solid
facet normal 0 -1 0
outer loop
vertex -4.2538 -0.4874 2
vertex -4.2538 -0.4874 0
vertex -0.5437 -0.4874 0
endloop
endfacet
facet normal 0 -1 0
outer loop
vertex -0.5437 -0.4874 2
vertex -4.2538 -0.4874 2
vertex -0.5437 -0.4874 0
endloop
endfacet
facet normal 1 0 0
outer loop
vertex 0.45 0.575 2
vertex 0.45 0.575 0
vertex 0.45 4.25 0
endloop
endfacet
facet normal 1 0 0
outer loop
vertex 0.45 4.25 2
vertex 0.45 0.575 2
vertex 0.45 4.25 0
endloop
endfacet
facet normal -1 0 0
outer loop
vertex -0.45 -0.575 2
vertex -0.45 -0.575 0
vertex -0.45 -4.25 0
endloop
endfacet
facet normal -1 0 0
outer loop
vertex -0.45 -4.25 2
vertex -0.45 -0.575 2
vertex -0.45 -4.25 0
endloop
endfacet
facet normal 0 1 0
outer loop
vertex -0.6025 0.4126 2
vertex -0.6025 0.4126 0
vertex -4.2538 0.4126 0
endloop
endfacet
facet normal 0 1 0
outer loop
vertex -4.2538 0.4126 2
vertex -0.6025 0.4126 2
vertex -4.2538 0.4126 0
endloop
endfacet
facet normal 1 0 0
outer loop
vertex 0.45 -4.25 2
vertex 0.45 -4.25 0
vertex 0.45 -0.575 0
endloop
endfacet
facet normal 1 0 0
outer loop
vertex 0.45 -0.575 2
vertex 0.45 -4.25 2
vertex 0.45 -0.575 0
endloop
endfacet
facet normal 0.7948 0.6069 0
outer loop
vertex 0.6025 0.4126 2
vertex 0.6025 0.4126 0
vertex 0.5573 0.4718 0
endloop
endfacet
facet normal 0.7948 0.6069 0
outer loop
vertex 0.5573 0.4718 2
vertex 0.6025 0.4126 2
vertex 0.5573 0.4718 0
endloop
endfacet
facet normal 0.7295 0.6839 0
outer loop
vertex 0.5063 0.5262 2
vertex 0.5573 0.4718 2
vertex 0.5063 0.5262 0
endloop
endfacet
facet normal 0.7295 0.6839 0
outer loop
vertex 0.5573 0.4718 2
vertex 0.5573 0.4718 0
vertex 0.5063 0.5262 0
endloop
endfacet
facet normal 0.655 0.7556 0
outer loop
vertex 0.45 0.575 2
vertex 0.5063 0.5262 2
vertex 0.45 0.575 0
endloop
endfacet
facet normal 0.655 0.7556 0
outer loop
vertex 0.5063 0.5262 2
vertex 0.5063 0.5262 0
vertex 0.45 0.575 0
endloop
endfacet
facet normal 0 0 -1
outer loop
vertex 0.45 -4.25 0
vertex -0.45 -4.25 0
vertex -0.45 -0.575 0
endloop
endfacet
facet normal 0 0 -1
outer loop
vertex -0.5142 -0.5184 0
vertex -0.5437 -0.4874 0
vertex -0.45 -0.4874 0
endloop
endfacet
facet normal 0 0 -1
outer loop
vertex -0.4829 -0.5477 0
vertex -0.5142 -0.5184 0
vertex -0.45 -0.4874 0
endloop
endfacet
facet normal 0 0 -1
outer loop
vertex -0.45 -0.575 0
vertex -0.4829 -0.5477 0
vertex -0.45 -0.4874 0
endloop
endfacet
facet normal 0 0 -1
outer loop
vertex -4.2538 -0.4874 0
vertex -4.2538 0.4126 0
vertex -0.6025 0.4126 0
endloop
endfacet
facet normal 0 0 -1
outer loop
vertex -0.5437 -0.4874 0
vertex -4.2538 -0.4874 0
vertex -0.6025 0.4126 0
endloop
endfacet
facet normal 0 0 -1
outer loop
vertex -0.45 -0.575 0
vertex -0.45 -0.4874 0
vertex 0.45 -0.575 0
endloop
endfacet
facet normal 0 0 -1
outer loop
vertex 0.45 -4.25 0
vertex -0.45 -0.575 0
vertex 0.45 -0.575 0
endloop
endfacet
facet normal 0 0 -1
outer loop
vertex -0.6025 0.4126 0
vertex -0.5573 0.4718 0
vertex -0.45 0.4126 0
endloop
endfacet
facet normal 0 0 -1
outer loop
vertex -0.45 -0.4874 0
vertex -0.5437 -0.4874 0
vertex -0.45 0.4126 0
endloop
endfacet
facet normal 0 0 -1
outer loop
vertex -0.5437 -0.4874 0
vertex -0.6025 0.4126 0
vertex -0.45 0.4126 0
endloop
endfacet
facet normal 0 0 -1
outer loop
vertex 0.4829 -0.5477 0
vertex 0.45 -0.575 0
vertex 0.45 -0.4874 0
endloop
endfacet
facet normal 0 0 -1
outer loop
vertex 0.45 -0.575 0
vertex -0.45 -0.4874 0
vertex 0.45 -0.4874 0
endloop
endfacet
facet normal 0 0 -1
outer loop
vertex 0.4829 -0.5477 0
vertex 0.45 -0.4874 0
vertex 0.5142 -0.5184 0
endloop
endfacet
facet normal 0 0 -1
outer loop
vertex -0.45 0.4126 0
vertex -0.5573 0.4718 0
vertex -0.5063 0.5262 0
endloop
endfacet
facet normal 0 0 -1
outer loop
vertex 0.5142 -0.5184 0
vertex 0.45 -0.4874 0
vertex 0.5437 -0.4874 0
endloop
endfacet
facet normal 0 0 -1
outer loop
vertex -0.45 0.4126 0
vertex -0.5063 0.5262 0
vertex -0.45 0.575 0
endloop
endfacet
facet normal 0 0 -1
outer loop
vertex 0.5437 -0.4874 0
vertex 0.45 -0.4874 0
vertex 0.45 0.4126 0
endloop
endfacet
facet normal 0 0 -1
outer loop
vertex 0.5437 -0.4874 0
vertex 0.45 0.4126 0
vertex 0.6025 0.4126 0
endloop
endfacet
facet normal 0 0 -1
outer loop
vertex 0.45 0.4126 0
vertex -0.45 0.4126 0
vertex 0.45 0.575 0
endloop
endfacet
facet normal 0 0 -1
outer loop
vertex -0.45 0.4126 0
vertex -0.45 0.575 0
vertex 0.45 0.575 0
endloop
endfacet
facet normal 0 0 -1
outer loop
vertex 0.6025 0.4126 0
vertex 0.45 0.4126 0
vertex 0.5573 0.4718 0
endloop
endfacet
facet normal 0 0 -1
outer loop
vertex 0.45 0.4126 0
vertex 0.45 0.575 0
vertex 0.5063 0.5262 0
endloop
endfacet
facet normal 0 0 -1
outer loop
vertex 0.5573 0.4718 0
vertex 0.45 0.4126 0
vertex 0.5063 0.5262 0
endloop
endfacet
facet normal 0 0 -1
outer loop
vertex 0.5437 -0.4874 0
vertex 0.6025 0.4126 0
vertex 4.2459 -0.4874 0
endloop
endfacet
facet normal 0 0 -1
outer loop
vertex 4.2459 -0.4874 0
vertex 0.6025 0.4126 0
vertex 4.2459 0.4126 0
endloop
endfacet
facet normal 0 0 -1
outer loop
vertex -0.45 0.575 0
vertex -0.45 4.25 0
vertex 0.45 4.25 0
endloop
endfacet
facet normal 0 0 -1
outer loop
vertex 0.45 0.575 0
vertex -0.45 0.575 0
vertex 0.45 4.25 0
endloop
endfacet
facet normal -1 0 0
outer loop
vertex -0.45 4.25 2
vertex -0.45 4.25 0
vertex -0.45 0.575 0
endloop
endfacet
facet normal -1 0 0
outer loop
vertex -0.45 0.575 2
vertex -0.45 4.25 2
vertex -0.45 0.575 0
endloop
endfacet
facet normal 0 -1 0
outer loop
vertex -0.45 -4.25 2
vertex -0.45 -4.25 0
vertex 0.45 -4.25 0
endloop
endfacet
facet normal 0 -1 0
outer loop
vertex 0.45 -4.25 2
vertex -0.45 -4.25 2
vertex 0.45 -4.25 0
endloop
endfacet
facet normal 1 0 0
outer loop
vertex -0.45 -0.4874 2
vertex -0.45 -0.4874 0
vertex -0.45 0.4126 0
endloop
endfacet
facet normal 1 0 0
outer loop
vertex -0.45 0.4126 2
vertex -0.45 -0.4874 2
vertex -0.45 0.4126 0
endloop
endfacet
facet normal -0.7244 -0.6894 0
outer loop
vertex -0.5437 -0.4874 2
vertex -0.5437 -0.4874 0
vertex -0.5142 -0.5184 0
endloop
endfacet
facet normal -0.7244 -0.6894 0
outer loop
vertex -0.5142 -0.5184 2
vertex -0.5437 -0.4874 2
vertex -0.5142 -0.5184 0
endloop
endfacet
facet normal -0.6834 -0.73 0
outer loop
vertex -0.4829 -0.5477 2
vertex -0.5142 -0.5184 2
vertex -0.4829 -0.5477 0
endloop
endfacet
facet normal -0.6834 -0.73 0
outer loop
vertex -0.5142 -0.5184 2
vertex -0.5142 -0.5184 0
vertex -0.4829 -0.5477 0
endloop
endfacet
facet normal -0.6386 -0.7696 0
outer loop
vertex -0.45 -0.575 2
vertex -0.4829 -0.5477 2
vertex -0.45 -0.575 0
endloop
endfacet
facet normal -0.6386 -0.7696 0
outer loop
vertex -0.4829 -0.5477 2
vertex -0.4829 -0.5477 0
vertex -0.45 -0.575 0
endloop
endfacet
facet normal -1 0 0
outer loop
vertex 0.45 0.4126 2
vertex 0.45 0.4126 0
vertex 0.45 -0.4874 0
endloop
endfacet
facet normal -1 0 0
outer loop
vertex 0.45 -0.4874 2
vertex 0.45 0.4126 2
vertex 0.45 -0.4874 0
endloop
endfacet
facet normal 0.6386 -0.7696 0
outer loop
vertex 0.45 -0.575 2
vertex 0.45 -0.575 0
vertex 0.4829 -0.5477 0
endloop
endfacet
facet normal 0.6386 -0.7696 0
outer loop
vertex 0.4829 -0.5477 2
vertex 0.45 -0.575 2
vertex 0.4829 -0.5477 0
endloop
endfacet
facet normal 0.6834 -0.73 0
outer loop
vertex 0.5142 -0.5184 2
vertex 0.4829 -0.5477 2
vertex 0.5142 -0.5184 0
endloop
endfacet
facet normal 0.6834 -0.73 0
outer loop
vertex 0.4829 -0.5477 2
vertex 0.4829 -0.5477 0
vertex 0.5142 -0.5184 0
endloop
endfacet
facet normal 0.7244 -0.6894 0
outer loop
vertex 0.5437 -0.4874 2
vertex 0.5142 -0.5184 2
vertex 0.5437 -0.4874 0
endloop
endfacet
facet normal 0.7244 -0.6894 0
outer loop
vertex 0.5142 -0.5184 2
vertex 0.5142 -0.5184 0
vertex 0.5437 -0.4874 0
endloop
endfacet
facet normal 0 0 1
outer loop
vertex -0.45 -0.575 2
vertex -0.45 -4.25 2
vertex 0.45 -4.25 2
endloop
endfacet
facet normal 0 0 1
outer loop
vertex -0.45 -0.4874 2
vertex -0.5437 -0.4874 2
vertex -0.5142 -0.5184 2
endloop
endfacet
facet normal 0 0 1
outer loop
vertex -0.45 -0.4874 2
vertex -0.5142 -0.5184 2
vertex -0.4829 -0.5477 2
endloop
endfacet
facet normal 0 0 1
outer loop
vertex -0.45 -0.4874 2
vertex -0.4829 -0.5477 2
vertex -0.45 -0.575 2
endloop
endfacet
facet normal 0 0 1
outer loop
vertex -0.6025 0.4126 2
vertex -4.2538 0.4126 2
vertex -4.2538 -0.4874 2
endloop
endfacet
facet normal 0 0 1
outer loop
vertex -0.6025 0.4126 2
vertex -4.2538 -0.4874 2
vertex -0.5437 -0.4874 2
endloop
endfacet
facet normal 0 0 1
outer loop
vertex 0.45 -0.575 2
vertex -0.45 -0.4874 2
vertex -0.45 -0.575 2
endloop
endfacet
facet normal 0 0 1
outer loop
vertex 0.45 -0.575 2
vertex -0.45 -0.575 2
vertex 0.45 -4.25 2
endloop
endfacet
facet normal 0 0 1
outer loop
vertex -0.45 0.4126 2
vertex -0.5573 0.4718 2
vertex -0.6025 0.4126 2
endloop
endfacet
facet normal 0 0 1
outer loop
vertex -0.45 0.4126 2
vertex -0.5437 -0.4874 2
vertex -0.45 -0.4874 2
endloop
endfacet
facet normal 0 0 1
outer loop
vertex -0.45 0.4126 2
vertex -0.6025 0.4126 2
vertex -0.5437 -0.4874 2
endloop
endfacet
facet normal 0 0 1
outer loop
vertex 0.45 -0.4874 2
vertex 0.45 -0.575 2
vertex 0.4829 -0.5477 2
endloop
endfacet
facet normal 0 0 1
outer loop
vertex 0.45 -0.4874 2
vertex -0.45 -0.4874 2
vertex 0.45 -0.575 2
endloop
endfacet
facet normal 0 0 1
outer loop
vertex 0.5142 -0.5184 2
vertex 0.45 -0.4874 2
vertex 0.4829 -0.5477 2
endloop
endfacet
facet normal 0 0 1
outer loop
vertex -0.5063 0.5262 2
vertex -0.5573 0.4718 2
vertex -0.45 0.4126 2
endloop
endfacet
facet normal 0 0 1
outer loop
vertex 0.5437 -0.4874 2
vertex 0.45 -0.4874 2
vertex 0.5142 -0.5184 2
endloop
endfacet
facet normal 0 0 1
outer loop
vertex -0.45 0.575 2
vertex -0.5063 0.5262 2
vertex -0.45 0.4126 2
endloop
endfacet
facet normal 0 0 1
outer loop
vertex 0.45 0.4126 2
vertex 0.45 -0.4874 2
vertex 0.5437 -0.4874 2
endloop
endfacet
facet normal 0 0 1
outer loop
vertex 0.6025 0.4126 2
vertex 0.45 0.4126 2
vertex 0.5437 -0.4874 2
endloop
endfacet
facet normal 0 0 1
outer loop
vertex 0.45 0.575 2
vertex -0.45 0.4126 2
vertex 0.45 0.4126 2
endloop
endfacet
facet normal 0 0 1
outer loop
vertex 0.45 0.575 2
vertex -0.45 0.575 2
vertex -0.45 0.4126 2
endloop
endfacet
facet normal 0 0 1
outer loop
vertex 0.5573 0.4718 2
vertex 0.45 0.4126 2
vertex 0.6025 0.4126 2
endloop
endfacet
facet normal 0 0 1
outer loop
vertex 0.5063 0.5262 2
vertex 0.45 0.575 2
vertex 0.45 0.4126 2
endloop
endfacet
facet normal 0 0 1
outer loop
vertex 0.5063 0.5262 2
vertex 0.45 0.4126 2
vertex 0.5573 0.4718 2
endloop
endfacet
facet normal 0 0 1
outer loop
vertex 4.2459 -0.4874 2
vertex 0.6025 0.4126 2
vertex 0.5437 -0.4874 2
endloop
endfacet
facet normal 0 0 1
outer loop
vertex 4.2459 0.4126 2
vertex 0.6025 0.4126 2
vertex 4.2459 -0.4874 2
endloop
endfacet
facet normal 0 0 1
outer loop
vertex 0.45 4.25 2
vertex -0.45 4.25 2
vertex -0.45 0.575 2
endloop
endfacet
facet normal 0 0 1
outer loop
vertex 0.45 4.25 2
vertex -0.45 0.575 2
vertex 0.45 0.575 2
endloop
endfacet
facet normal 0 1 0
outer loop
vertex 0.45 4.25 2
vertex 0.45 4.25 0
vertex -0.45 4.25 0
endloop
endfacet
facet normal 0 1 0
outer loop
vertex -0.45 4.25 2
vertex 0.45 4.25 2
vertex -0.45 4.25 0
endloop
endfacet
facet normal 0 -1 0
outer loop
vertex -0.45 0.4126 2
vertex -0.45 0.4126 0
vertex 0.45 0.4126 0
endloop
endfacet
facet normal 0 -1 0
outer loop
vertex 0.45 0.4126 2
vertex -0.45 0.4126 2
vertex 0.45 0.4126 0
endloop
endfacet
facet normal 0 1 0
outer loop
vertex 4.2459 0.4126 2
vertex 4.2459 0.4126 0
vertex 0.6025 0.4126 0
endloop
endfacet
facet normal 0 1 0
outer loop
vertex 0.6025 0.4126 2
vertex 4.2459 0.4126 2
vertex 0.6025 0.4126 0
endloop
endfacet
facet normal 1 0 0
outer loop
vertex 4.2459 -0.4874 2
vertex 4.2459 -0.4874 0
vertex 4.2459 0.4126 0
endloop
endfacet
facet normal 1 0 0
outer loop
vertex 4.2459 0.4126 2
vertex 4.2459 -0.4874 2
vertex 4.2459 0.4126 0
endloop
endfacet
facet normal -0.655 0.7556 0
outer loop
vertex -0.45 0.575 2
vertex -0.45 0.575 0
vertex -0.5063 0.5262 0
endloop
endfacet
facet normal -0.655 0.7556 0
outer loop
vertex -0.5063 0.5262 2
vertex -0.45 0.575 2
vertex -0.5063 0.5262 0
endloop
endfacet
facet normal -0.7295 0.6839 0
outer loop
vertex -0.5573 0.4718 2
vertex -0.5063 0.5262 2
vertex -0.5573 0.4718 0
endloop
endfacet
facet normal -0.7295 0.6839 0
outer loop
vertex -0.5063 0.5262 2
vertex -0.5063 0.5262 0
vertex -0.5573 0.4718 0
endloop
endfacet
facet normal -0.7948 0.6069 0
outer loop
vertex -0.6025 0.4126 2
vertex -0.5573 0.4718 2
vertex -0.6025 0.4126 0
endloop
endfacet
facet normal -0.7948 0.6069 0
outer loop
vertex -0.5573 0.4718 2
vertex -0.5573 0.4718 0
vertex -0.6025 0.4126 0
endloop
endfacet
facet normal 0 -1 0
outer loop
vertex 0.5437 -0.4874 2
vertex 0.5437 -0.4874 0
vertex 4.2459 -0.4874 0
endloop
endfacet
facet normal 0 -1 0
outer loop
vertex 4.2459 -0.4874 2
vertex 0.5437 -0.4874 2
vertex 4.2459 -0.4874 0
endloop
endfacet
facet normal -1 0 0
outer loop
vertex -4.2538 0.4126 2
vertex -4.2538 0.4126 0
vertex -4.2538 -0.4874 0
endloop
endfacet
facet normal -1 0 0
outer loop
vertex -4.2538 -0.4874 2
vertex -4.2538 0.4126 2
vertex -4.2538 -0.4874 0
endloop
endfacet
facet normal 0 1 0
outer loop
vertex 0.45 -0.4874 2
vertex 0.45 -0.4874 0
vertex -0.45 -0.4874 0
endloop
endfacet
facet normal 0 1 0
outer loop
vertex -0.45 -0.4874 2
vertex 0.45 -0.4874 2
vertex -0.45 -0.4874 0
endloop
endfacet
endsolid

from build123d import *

# Parameters (mm, degrees)
F1_DEPTH = 2


# Not quite as in the source:
# - the program builds the solid bodies; features that only make, move or delete a surface that nothing else refers to are left out


with BuildPart() as f1:
    # F0 (on Top) → F1 (new body)
    with BuildSketch(Plane.XY):
        with BuildLine():
            ThreePointArc((0.5437049493, -0.4874087926), (0.6819795338, -0.2609335518), (0.7301934011, 0))
            ThreePointArc((0.7301934011, 0), (0.697527915, 0.2159565019), (0.6024540634, 0.4125912074))
            Line((0.6024540634, 0.4125912074), (0.45, 0.4125912074))
            Line((0.45, 0.4125912074), (0.45, -0.4874087926))
            Line((0.45, -0.4874087926), (0.5437049493, -0.4874087926))
        make_face()
        with BuildLine():
            ThreePointArc((0.6024540634, 0.4125912074), (0.697527915, 0.2159565019), (0.7301934011, 0))
            ThreePointArc((0.7301934011, 0), (0.6819795338, -0.2609335518), (0.5437049493, -0.4874087926))
            Line((0.5437049493, -0.4874087926), (4.2458724273, -0.4874087926))
            Line((4.2458724273, -0.4874087926), (4.2458724273, 0.4125912074))
            Line((4.2458724273, 0.4125912074), (0.6024540634, 0.4125912074))
        make_face()
        with BuildLine():
            Line((0.45, 0.4125912074), (0.6024540634, 0.4125912074))
            ThreePointArc((0.6024540634, 0.4125912074), (0.5324594789, 0.4996691968), (0.45, 0.5750499134))
            Line((0.45, 0.5750499134), (0.45, 0.4125912074))
        make_face()
        with BuildLine():
            ThreePointArc((0.45, -0.5750499134), (0.4987811374, -0.5332914587), (0.5437049493, -0.4874087926))
            Line((0.5437049493, -0.4874087926), (0.45, -0.4874087926))
            Line((0.45, -0.4874087926), (0.45, -0.5750499134))
        make_face()
        with BuildLine():
            Line((0.45, 0.4125912074), (0.45, 0.5750499134))
            ThreePointArc((0.45, 0.5750499134), (0, 0.7301934011), (-0.45, 0.5750499134))
            Line((-0.45, 0.5750499134), (-0.45, 0.4125912074))
            Line((-0.45, 0.4125912074), (0.45, 0.4125912074))
        make_face()
        with BuildLine():
            ThreePointArc((-0.45, 0.5750499134), (0, 0.7301934011), (0.45, 0.5750499134))
            Line((0.45, 0.5750499134), (0.45, 4.25))
            Line((0.45, 4.25), (-0.45, 4.25))
            Line((-0.45, 4.25), (-0.45, 0.5750499134))
        make_face()
        with BuildLine():
            Line((0.45, -4.25), (0.45, -0.5750499134))
            ThreePointArc((0.45, -0.5750499134), (0, -0.7301934011), (-0.45, -0.5750499134))
            Line((-0.45, -0.5750499134), (-0.45, -4.25))
            Line((-0.45, -4.25), (0.45, -4.25))
        make_face()
        with BuildLine():
            ThreePointArc((-0.45, -0.5750499134), (0, -0.7301934011), (0.45, -0.5750499134))
            Line((0.45, -0.5750499134), (0.45, -0.4874087926))
            Line((0.45, -0.4874087926), (-0.45, -0.4874087926))
            Line((-0.45, -0.4874087926), (-0.45, -0.5750499134))
        make_face()
        with BuildLine():
            Line((-0.45, 0.4125912074), (-0.45, 0.5750499134))
            ThreePointArc((-0.45, 0.5750499134), (-0.5324594789, 0.4996691968), (-0.6024540634, 0.4125912074))
            Line((-0.6024540634, 0.4125912074), (-0.45, 0.4125912074))
        make_face()
        with BuildLine():
            Line((-0.45, -0.4874087926), (-0.45, 0.4125912074))
            Line((-0.45, 0.4125912074), (-0.6024540634, 0.4125912074))
            ThreePointArc((-0.6024540634, 0.4125912074), (-0.7286426563, -0.0475634562), (-0.5437049493, -0.4874087926))
            Line((-0.5437049493, -0.4874087926), (-0.45, -0.4874087926))
        make_face()
        with BuildLine():
            ThreePointArc((-0.5437049493, -0.4874087926), (-0.4987811374, -0.5332914587), (-0.45, -0.5750499134))
            Line((-0.45, -0.5750499134), (-0.45, -0.4874087926))
            Line((-0.45, -0.4874087926), (-0.5437049493, -0.4874087926))
        make_face()
        with BuildLine():
            ThreePointArc((-0.5437049493, -0.4874087926), (-0.7286426563, -0.0475634562), (-0.6024540634, 0.4125912074))
            Line((-0.6024540634, 0.4125912074), (-4.2537945996, 0.4125912074))
            Line((-4.2537945996, 0.4125912074), (-4.2537945996, -0.4874087926))
            Line((-4.2537945996, -0.4874087926), (-0.5437049493, -0.4874087926))
        make_face()
    extrude(amount=F1_DEPTH)


solid = f1.part
